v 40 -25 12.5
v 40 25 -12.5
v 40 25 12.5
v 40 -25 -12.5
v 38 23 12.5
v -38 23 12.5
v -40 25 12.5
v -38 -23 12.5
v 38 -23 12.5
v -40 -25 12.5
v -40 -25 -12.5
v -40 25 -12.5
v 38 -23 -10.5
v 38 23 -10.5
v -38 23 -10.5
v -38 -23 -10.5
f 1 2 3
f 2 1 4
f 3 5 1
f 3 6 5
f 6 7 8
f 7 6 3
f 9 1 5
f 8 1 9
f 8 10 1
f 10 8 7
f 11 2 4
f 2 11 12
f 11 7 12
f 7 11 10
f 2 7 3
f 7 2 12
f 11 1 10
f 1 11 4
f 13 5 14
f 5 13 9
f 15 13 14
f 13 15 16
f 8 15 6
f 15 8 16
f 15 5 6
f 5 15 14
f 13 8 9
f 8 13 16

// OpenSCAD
// GHOST Parametric Model: sensor_enclosure
// Generated at 2026-11-10 21:27:17
width = 50;
length = 80;
height = 25;
wall = 2;

difference() {
    cube([length, width, height], center=true);
    translate([0, 0, wall])
        cube([length - (wall * 2), width - (wall * 2), height], center=true);
}
